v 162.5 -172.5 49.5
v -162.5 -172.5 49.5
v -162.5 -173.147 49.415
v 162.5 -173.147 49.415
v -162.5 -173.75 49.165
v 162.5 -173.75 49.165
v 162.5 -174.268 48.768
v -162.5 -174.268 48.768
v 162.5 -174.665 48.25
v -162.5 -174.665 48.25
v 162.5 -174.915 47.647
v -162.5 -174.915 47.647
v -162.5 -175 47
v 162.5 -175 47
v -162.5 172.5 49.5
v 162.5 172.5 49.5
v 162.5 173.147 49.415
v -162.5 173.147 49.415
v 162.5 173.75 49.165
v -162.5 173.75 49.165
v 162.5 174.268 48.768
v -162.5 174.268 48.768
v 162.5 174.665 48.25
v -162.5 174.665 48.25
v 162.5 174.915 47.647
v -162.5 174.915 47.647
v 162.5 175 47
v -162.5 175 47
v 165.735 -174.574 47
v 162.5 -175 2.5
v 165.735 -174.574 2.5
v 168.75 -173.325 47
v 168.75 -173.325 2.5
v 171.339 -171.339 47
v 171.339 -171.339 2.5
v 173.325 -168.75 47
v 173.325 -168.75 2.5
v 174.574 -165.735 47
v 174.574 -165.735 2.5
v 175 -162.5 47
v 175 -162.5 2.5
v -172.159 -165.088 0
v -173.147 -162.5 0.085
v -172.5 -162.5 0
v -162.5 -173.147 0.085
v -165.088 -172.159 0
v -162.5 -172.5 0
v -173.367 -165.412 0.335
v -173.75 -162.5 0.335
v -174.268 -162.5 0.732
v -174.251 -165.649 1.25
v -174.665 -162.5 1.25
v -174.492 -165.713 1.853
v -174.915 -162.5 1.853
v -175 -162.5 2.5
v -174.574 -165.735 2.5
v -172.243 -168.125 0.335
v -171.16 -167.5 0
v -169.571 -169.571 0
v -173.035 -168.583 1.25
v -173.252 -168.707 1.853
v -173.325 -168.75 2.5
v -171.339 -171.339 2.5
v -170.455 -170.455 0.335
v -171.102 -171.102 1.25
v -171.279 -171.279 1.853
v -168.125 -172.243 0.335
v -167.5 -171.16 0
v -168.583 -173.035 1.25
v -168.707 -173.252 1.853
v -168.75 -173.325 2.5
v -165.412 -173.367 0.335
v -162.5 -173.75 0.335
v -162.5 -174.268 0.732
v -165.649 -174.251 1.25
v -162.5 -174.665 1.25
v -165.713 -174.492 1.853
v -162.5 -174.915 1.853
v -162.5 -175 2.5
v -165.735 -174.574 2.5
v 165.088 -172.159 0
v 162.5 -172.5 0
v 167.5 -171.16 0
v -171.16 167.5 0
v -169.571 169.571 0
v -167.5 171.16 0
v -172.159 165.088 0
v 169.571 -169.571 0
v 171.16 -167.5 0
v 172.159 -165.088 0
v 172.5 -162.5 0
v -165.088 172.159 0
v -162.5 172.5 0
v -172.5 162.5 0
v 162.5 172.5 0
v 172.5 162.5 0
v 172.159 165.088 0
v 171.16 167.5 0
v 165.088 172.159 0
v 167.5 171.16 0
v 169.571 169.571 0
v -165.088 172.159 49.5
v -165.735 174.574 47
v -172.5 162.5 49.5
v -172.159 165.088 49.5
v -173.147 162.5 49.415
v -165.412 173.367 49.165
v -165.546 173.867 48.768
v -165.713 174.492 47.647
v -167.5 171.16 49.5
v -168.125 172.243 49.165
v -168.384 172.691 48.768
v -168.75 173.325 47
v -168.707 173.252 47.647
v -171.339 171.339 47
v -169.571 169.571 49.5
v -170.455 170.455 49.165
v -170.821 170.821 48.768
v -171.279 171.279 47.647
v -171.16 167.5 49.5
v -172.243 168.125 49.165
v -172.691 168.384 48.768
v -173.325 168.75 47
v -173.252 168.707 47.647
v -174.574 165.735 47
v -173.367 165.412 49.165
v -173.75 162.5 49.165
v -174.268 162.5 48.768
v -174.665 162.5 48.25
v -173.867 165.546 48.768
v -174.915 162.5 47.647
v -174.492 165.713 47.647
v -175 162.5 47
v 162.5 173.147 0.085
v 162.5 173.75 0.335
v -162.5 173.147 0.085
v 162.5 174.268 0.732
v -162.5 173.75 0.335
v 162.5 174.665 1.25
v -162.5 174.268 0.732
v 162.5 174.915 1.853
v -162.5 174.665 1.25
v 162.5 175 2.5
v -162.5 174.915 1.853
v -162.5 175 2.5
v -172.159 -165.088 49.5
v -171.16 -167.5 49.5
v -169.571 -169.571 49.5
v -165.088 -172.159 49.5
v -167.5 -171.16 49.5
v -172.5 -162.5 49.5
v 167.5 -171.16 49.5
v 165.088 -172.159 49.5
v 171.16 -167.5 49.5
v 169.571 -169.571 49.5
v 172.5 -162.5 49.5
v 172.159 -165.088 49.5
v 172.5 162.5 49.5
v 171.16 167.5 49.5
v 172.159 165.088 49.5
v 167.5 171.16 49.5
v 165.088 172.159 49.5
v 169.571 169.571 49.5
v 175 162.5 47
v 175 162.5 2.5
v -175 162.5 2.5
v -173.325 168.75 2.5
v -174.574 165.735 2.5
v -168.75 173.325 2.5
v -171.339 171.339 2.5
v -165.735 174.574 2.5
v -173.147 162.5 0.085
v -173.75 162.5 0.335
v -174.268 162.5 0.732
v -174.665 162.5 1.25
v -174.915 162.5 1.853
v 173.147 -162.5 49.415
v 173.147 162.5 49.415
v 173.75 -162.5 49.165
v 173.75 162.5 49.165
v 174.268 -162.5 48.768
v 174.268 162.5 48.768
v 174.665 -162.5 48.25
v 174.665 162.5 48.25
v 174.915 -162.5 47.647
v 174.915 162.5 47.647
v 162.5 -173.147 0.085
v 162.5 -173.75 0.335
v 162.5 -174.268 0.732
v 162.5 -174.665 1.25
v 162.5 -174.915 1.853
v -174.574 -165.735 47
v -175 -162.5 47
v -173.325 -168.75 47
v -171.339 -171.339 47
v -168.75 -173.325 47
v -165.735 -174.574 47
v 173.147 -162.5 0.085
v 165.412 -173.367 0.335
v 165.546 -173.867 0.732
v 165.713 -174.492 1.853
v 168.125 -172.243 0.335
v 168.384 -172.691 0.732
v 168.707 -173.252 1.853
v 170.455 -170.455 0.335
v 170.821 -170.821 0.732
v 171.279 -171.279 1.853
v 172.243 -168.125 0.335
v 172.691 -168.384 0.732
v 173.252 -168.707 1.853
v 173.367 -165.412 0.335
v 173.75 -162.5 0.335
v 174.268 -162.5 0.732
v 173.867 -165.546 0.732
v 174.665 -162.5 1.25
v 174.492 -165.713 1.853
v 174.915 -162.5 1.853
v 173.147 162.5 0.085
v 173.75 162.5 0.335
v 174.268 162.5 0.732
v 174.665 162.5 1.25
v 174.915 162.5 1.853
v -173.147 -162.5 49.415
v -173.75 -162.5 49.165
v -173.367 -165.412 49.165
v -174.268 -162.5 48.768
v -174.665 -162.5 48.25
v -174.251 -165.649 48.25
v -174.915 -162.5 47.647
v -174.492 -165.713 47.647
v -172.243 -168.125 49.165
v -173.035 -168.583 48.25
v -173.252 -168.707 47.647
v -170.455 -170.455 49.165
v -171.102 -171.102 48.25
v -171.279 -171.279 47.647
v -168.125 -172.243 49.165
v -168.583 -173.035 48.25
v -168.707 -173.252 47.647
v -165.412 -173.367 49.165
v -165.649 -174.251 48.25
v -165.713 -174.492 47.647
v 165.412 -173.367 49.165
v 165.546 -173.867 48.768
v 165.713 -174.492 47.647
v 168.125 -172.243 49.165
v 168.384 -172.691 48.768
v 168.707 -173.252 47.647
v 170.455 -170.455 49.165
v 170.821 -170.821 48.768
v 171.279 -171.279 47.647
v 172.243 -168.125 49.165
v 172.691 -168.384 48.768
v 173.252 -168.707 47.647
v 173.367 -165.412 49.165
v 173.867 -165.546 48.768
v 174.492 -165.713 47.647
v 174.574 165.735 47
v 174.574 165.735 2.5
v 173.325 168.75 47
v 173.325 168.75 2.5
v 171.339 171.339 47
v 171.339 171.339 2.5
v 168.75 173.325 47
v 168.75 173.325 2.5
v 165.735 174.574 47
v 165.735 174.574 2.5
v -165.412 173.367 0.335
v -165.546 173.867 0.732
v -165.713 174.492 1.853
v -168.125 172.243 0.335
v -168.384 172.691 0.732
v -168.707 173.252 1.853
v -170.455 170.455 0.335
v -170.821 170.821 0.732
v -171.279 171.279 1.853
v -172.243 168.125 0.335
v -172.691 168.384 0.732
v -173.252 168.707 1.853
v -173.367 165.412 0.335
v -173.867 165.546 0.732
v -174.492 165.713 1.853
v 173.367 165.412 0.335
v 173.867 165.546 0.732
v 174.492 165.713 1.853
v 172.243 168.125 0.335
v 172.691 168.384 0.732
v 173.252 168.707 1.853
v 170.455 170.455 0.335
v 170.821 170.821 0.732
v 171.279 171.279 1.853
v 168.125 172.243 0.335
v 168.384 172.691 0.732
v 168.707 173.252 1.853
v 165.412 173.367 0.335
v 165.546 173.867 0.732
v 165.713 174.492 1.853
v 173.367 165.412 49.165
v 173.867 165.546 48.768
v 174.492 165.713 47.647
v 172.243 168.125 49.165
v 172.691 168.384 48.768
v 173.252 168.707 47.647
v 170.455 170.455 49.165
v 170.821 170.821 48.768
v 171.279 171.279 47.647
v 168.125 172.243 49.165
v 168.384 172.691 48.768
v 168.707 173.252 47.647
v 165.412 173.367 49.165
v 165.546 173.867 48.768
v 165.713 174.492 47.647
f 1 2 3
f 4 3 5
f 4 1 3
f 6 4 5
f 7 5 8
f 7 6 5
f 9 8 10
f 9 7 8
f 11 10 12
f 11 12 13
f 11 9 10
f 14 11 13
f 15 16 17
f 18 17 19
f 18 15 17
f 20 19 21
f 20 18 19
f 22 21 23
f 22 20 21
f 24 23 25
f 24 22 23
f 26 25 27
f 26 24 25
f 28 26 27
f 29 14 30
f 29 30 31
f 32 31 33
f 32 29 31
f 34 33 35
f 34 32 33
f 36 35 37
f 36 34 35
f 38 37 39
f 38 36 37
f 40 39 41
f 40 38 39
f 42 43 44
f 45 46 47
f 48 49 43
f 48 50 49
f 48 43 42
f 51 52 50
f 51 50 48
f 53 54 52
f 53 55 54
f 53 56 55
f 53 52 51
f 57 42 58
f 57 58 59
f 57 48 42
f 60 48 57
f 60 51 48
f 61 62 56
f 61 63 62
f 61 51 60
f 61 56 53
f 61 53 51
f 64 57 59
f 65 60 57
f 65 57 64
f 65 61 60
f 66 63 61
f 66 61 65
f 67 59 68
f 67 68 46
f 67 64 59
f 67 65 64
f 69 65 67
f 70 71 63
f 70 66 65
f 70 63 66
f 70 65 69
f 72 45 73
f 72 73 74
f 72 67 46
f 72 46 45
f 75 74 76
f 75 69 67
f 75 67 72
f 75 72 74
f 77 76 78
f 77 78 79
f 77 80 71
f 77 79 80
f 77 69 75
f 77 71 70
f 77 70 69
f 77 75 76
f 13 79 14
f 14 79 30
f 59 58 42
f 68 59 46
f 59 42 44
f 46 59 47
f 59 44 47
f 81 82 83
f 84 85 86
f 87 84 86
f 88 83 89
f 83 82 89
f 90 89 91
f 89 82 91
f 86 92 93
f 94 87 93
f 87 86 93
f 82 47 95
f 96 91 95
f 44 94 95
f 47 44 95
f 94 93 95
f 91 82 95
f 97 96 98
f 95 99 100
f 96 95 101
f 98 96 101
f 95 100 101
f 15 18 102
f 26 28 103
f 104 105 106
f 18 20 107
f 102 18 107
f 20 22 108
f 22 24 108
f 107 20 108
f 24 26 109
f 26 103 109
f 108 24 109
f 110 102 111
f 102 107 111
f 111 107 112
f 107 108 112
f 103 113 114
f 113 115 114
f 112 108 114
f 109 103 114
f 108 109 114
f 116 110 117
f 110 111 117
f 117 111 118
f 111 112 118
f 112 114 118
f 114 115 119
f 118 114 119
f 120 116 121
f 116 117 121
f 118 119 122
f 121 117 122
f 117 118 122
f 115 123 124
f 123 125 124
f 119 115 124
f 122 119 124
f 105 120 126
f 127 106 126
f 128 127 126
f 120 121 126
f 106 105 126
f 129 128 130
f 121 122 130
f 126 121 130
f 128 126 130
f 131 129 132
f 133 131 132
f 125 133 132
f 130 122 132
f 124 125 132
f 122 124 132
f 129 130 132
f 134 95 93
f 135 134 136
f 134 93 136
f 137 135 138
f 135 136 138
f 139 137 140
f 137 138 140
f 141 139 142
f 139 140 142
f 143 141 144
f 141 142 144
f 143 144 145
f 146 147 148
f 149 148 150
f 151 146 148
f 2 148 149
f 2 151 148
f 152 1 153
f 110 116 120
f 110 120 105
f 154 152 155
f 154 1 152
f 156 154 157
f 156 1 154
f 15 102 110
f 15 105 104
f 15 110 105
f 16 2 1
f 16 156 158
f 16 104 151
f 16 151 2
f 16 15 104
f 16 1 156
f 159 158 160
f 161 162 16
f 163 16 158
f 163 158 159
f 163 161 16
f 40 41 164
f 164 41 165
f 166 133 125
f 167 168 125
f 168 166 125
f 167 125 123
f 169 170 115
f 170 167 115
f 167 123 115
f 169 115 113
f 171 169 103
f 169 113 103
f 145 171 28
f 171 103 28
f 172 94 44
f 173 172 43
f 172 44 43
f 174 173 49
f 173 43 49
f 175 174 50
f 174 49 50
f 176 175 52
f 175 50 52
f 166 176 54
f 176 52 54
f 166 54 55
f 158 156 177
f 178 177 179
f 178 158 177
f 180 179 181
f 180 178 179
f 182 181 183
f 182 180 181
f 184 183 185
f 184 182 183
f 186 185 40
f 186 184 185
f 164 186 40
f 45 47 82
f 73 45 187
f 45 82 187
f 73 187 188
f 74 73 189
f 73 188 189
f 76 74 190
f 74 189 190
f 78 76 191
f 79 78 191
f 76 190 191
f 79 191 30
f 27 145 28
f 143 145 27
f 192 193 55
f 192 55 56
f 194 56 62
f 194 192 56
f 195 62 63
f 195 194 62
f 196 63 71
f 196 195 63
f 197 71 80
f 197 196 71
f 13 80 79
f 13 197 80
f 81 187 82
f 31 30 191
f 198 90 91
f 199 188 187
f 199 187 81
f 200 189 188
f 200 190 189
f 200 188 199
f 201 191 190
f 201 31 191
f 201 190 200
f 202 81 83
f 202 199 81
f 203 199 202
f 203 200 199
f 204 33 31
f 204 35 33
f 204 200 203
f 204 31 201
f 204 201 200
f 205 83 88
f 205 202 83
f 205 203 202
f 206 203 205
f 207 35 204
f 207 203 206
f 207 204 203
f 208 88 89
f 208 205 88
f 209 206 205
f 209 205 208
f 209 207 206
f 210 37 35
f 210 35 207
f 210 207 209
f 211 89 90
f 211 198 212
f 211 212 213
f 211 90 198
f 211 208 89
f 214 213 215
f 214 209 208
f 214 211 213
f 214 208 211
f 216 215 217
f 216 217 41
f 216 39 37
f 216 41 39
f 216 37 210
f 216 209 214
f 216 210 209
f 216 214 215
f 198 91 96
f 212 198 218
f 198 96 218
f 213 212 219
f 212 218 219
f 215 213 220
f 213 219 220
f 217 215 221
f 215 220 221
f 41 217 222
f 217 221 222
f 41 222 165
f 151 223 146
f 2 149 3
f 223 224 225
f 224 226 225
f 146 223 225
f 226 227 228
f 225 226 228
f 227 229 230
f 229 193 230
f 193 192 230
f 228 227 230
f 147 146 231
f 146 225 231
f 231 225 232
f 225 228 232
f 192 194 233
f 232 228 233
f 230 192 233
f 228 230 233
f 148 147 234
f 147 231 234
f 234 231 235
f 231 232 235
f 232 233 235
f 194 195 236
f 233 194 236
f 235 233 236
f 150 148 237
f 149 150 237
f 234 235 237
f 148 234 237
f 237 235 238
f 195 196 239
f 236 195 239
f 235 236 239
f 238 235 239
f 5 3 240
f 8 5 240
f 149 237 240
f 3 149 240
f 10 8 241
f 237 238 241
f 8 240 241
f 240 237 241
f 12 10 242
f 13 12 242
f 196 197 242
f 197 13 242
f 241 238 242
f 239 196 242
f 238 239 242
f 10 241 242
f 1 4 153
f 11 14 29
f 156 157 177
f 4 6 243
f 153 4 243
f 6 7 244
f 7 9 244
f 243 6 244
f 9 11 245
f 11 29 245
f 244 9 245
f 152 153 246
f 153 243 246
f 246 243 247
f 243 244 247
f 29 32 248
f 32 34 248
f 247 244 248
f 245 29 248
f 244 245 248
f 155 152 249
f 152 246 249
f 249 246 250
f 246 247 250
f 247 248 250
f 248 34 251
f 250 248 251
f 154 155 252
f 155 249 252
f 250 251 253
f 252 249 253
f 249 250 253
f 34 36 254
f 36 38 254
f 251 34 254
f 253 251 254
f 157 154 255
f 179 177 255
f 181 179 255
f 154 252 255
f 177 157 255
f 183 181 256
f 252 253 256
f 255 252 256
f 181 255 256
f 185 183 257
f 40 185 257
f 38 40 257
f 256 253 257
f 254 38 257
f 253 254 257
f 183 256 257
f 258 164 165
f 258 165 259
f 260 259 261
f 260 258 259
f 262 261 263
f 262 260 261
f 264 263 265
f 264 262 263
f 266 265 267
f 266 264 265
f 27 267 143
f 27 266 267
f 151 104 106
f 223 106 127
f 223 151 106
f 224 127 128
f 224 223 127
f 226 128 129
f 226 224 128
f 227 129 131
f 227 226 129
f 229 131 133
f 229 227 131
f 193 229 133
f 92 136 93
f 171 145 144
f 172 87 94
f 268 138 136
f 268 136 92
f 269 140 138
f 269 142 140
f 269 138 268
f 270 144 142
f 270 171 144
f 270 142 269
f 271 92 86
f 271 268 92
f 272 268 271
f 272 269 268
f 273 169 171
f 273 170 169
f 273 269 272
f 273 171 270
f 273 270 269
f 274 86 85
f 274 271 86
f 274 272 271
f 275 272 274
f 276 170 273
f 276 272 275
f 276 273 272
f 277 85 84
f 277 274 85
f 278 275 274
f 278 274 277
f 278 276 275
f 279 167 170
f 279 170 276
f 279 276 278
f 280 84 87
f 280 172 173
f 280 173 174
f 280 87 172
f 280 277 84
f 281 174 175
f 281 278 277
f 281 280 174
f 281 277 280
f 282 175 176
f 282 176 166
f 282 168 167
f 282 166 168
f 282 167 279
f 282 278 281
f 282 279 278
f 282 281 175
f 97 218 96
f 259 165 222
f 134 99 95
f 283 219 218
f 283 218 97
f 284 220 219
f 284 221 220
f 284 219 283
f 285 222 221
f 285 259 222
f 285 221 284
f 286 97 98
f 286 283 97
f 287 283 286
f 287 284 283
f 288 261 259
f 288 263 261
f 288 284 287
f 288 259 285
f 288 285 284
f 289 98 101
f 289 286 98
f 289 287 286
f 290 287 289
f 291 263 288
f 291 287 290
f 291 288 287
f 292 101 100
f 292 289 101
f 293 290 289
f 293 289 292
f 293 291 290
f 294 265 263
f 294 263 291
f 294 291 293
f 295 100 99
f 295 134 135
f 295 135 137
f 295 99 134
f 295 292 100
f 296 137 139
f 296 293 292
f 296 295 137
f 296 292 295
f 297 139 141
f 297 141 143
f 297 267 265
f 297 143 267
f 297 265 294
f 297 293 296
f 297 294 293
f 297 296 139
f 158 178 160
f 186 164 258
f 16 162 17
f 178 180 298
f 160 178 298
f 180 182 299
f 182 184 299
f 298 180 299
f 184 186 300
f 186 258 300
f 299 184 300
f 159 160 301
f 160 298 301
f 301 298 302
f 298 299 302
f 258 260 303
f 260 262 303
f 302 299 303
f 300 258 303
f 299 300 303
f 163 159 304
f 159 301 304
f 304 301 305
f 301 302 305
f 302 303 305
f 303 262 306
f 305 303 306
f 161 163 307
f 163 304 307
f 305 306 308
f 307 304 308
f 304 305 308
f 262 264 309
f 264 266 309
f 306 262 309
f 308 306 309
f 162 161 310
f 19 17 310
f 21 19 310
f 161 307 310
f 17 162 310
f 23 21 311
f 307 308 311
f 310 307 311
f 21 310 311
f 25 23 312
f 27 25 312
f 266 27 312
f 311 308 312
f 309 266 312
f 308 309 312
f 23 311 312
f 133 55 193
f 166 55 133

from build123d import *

# Parameters (mm, degrees)
F0_W     = 350
F0_H     = 350
F1_DEPTH = 49.5
F2_R     = 12.5
F3_R     = 2.5


with BuildPart() as f1:
    # F0 (on Top) → F1 (new body)
    with BuildSketch(Plane.XY):
        Rectangle(F0_W, F0_H)
    extrude(amount=F1_DEPTH)

    # F2
    f2_edges = [f1.edges().sort_by_distance(p)[0] for p in [
        (175, -175, 24.75),
        (175, 175, 24.75),
        (-175, 175, 24.75),
        (-175, -175, 24.75),
    ]]
    fillet(f2_edges, radius=F2_R)

    # F3
    f3_edges = [f1.edges().sort_by_distance(p)[0] for p in [
        (0, -175, 0),
        (0, -175, 49.5),
    ]]
    fillet(f3_edges, radius=F3_R)


solid = f1.part
